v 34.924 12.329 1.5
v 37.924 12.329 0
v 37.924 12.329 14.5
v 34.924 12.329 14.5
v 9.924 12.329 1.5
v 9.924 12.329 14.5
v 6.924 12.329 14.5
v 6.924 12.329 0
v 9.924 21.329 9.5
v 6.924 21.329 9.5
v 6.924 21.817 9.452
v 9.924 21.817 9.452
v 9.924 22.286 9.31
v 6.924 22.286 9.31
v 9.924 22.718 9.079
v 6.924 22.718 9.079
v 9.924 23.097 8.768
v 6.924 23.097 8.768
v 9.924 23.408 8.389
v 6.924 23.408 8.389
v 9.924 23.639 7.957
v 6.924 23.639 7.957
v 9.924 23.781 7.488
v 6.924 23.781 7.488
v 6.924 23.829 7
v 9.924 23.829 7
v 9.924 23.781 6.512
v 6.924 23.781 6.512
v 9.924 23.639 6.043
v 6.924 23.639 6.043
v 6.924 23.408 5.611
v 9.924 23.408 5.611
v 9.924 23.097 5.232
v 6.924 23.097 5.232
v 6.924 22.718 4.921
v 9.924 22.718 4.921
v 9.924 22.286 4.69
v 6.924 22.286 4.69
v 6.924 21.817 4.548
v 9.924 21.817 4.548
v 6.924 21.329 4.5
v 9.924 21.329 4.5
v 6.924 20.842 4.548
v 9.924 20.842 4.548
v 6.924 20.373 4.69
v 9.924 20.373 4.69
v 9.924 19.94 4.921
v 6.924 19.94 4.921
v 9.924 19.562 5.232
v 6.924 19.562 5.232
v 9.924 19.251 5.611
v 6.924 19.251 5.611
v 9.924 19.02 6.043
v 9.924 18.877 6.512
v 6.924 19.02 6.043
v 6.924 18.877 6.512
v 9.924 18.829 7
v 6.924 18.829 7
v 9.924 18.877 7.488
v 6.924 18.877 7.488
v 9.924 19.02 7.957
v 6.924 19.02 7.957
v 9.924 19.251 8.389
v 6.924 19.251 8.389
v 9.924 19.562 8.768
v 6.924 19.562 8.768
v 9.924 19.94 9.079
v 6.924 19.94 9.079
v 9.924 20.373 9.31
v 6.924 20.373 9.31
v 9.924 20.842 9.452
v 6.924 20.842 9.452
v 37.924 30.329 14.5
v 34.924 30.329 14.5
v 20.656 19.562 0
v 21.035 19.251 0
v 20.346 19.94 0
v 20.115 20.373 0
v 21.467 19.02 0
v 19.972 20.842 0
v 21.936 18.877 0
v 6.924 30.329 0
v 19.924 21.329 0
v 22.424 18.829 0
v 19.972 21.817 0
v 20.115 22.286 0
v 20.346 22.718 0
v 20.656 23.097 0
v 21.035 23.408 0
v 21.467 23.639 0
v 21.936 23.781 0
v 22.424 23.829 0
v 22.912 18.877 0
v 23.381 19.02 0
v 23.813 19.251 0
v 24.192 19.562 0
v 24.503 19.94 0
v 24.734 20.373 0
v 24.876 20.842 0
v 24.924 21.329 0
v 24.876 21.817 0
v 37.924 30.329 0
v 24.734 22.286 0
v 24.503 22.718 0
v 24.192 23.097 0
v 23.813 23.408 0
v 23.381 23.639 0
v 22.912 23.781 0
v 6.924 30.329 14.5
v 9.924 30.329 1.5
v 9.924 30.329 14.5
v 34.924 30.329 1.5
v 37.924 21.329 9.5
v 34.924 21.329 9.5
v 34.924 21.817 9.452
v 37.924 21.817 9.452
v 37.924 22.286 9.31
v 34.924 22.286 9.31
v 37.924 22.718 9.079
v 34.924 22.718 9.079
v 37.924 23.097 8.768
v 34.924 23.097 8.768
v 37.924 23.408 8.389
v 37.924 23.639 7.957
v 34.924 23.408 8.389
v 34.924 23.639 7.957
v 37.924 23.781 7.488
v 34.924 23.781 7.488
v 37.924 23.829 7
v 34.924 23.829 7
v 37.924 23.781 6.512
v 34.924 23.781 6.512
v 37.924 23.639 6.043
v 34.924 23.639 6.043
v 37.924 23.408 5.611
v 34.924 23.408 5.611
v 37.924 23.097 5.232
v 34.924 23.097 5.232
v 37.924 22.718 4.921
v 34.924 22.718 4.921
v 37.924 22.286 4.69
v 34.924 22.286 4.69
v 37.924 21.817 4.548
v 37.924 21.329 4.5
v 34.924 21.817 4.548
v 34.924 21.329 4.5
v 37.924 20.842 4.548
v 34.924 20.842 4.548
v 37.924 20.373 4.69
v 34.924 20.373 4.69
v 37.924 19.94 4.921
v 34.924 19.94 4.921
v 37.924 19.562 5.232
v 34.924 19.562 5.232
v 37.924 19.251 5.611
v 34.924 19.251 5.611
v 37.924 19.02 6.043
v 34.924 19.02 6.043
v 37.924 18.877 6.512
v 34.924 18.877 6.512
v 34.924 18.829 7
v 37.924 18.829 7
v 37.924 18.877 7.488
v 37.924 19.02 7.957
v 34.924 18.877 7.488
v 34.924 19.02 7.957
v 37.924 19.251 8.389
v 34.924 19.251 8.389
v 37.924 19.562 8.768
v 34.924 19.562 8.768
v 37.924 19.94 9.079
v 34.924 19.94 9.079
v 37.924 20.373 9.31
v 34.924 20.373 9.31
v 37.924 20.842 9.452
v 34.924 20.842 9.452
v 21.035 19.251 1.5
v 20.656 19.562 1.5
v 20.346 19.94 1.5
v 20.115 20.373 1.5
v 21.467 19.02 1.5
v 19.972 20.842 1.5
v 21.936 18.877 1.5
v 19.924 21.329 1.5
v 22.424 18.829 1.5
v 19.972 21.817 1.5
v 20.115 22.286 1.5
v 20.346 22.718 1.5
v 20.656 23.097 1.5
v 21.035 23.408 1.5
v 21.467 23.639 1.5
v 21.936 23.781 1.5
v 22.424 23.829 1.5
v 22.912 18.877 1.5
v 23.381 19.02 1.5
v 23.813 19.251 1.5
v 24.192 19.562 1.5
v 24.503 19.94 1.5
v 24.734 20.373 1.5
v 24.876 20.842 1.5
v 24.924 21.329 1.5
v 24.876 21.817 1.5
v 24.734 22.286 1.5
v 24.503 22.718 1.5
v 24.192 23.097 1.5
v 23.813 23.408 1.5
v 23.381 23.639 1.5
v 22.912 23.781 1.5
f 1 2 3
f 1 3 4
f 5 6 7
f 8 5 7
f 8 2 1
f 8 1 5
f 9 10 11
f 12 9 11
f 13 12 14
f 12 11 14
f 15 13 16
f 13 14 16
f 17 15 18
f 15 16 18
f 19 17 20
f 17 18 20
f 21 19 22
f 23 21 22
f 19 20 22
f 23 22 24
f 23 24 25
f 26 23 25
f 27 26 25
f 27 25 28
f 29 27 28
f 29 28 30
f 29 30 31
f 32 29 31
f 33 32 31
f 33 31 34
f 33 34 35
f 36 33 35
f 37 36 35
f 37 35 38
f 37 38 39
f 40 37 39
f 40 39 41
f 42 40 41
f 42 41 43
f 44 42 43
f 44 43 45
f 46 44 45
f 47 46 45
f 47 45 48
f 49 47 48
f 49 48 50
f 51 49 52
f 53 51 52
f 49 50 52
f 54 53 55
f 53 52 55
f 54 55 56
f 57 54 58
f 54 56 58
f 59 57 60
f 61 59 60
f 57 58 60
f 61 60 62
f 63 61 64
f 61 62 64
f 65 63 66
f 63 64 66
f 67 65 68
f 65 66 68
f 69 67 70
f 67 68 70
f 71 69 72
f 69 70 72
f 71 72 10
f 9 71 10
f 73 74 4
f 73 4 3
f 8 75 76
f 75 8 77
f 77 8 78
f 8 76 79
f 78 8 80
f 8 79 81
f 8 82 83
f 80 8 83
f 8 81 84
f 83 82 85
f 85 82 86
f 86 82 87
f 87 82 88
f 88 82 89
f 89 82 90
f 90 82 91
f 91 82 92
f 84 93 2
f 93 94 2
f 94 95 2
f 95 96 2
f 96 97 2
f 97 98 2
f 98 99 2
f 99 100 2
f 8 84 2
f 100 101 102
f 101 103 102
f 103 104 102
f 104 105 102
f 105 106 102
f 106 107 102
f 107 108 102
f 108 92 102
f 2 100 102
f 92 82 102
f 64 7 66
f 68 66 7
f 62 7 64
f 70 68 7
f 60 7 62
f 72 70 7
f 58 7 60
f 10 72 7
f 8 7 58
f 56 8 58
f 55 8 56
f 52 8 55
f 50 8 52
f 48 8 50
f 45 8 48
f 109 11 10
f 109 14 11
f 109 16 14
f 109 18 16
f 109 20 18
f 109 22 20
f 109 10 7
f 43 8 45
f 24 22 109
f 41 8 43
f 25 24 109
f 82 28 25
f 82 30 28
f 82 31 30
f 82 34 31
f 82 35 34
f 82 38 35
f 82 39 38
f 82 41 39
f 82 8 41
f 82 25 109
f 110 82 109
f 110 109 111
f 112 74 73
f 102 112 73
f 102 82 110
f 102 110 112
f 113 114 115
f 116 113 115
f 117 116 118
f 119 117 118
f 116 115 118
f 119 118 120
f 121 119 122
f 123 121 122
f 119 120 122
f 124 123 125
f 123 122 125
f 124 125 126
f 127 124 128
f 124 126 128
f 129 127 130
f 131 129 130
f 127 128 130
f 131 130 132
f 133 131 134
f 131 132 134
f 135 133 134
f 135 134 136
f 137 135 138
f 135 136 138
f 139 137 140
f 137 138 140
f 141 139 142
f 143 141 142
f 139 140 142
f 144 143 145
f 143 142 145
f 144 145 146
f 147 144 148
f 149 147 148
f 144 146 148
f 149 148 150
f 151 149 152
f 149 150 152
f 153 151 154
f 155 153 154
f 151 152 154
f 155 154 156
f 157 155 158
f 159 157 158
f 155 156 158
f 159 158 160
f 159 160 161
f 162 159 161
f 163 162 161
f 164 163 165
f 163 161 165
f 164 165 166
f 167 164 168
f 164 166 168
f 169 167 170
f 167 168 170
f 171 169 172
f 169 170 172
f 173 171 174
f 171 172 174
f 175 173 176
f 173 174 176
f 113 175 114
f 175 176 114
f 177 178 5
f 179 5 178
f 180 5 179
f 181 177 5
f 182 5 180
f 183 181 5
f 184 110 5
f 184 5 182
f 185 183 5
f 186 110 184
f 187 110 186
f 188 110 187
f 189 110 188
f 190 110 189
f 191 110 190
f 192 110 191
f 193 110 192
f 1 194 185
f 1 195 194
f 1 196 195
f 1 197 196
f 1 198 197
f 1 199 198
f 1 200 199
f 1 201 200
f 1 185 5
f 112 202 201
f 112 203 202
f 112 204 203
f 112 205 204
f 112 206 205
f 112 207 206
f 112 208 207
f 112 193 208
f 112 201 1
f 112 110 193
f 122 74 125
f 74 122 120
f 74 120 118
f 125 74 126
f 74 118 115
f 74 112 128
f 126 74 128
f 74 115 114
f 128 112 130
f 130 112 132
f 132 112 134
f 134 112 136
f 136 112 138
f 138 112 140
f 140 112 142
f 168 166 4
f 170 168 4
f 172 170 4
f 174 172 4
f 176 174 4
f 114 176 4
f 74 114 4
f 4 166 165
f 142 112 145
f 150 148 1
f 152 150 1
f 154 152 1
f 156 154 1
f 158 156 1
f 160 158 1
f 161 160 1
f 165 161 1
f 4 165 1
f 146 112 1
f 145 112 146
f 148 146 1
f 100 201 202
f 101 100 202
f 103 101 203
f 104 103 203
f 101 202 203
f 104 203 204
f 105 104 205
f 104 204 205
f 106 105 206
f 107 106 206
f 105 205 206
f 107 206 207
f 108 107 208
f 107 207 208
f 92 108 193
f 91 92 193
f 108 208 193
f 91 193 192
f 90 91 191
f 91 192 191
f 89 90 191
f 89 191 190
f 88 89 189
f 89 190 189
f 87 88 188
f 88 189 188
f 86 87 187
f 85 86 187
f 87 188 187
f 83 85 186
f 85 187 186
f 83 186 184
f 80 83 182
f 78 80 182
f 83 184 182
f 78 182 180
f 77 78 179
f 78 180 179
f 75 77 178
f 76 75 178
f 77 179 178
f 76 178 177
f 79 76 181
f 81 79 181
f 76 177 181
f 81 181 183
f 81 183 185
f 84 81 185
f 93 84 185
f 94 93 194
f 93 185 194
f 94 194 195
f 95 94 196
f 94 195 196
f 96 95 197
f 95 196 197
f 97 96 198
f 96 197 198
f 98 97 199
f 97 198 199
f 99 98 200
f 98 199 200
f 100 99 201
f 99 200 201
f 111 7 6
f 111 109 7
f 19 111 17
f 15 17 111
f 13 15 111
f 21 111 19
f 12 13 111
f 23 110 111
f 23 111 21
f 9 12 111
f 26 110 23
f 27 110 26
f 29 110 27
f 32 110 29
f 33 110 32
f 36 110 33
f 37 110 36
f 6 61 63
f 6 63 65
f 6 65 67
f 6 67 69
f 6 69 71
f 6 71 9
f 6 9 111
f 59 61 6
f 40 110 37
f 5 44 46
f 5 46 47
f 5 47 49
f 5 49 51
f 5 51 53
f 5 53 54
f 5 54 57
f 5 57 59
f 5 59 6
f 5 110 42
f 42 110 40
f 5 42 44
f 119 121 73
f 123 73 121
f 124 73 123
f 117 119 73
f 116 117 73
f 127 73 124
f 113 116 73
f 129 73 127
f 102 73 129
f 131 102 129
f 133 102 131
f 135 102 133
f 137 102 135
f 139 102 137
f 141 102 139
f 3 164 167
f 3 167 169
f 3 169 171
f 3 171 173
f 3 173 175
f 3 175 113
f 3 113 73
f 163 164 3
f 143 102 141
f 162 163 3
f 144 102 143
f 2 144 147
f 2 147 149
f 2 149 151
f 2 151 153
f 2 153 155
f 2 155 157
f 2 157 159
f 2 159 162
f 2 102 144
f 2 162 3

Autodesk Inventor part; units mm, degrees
ref_plane "YZ Plane" through (0, 0, 0) normal (1, 0, 0) x (0, 1, 0)
ref_plane "XZ Plane" through (0, 0, 0) normal (0, 1, 0) x (-1, 0, 0)
ref_plane "XY Plane" through (0, 0, 0) normal (0, 0, 1) x (1, 0, 0)
sketch "Sketch1" plane through (0, 0, 0) normal (0, 0, 1) x (1, 0, 0)
  line L0 (6.9242, 30.3294) -> (37.9242, 30.3294)
  line L1 (37.9242, 30.3294) -> (37.9242, 12.3294)
  line L2 (37.9242, 12.3294) -> (6.9242, 12.3294)
  line L3 (6.9242, 12.3294) -> (6.9242, 30.3294)
  point P0 (0, 0)
  dimension "d0" = 31
  dimension "d1" = 18
extrude "Extrusion1" add sketch "Sketch1" along normal blind 1.5
sketch "Sketch2" plane through (0, 0, 1.5) normal (0, 0, 1) x (1, 0, 0)
  line L0 (37.9242, 30.3294) -> (6.9242, 30.3294) projected
  line L1 (6.9242, 30.3294) -> (9.9242, 30.3294)
  line L2 (9.9242, 30.3294) -> (9.9242, 12.3294)
  line L3 (9.9242, 12.3294) -> (6.9242, 12.3294)
  line L4 (6.9242, 12.3294) -> (6.9242, 30.3294)
  line L5 (37.9242, 12.3294) -> (37.9242, 30.3294) projected
  line L6 (37.9242, 30.3294) -> (34.9242, 30.3294)
  line L7 (34.9242, 30.3294) -> (34.9242, 12.3294)
  line L8 (34.9242, 12.3294) -> (37.9242, 12.3294)
  line L9 (37.9242, 12.3294) -> (37.9242, 30.3294)
  point P0 (0, 0)
  dimension "d4" = 3
  dimension "d5" = 18
  dimension "d6" = 3
  dimension "d7" = 18
extrude "Extrusion2" add sketch "Sketch2" along normal blind 13
sketch "Sketch3" plane through (6.9242, 12.3294, 0) normal (-1, 0, 0) x (0, 0, 1)
  line L0 (0, 18) -> (0, 0) projected
  circle A0 centre (7, 9) radius 2.5
  point P0 (0, -12.3294)
extrude "Extrusion3" cut sketch "Sketch3" against normal blind 50
sketch "Sketch4" plane through (0, 0, 1.5) normal (0, 0, 1) x (1, 0, 0)
  line L0 (37.9242, 30.3294) -> (6.9242, 30.3294) projected
  line L1 (6.9242, 12.3294) -> (37.9242, 12.3294) projected
  circle A0 centre (22.4242, 21.3294) radius 2.5
  point P0 (0, 0)
extrude "Extrusion4" cut sketch "Sketch4" against normal blind 50
thread "Thread1" size "M5x0.8" class "6H" standard "ANSI Metric M Profile" length 43.6
thread "Thread2" size "M5x0.8" class "6H" standard "ANSI Metric M Profile" length 43.6
thread "Thread3" size "M5x0.8" class "6H" standard "ANSI Metric M Profile" length 43.6
properties part number "penyangga kamera 1"
